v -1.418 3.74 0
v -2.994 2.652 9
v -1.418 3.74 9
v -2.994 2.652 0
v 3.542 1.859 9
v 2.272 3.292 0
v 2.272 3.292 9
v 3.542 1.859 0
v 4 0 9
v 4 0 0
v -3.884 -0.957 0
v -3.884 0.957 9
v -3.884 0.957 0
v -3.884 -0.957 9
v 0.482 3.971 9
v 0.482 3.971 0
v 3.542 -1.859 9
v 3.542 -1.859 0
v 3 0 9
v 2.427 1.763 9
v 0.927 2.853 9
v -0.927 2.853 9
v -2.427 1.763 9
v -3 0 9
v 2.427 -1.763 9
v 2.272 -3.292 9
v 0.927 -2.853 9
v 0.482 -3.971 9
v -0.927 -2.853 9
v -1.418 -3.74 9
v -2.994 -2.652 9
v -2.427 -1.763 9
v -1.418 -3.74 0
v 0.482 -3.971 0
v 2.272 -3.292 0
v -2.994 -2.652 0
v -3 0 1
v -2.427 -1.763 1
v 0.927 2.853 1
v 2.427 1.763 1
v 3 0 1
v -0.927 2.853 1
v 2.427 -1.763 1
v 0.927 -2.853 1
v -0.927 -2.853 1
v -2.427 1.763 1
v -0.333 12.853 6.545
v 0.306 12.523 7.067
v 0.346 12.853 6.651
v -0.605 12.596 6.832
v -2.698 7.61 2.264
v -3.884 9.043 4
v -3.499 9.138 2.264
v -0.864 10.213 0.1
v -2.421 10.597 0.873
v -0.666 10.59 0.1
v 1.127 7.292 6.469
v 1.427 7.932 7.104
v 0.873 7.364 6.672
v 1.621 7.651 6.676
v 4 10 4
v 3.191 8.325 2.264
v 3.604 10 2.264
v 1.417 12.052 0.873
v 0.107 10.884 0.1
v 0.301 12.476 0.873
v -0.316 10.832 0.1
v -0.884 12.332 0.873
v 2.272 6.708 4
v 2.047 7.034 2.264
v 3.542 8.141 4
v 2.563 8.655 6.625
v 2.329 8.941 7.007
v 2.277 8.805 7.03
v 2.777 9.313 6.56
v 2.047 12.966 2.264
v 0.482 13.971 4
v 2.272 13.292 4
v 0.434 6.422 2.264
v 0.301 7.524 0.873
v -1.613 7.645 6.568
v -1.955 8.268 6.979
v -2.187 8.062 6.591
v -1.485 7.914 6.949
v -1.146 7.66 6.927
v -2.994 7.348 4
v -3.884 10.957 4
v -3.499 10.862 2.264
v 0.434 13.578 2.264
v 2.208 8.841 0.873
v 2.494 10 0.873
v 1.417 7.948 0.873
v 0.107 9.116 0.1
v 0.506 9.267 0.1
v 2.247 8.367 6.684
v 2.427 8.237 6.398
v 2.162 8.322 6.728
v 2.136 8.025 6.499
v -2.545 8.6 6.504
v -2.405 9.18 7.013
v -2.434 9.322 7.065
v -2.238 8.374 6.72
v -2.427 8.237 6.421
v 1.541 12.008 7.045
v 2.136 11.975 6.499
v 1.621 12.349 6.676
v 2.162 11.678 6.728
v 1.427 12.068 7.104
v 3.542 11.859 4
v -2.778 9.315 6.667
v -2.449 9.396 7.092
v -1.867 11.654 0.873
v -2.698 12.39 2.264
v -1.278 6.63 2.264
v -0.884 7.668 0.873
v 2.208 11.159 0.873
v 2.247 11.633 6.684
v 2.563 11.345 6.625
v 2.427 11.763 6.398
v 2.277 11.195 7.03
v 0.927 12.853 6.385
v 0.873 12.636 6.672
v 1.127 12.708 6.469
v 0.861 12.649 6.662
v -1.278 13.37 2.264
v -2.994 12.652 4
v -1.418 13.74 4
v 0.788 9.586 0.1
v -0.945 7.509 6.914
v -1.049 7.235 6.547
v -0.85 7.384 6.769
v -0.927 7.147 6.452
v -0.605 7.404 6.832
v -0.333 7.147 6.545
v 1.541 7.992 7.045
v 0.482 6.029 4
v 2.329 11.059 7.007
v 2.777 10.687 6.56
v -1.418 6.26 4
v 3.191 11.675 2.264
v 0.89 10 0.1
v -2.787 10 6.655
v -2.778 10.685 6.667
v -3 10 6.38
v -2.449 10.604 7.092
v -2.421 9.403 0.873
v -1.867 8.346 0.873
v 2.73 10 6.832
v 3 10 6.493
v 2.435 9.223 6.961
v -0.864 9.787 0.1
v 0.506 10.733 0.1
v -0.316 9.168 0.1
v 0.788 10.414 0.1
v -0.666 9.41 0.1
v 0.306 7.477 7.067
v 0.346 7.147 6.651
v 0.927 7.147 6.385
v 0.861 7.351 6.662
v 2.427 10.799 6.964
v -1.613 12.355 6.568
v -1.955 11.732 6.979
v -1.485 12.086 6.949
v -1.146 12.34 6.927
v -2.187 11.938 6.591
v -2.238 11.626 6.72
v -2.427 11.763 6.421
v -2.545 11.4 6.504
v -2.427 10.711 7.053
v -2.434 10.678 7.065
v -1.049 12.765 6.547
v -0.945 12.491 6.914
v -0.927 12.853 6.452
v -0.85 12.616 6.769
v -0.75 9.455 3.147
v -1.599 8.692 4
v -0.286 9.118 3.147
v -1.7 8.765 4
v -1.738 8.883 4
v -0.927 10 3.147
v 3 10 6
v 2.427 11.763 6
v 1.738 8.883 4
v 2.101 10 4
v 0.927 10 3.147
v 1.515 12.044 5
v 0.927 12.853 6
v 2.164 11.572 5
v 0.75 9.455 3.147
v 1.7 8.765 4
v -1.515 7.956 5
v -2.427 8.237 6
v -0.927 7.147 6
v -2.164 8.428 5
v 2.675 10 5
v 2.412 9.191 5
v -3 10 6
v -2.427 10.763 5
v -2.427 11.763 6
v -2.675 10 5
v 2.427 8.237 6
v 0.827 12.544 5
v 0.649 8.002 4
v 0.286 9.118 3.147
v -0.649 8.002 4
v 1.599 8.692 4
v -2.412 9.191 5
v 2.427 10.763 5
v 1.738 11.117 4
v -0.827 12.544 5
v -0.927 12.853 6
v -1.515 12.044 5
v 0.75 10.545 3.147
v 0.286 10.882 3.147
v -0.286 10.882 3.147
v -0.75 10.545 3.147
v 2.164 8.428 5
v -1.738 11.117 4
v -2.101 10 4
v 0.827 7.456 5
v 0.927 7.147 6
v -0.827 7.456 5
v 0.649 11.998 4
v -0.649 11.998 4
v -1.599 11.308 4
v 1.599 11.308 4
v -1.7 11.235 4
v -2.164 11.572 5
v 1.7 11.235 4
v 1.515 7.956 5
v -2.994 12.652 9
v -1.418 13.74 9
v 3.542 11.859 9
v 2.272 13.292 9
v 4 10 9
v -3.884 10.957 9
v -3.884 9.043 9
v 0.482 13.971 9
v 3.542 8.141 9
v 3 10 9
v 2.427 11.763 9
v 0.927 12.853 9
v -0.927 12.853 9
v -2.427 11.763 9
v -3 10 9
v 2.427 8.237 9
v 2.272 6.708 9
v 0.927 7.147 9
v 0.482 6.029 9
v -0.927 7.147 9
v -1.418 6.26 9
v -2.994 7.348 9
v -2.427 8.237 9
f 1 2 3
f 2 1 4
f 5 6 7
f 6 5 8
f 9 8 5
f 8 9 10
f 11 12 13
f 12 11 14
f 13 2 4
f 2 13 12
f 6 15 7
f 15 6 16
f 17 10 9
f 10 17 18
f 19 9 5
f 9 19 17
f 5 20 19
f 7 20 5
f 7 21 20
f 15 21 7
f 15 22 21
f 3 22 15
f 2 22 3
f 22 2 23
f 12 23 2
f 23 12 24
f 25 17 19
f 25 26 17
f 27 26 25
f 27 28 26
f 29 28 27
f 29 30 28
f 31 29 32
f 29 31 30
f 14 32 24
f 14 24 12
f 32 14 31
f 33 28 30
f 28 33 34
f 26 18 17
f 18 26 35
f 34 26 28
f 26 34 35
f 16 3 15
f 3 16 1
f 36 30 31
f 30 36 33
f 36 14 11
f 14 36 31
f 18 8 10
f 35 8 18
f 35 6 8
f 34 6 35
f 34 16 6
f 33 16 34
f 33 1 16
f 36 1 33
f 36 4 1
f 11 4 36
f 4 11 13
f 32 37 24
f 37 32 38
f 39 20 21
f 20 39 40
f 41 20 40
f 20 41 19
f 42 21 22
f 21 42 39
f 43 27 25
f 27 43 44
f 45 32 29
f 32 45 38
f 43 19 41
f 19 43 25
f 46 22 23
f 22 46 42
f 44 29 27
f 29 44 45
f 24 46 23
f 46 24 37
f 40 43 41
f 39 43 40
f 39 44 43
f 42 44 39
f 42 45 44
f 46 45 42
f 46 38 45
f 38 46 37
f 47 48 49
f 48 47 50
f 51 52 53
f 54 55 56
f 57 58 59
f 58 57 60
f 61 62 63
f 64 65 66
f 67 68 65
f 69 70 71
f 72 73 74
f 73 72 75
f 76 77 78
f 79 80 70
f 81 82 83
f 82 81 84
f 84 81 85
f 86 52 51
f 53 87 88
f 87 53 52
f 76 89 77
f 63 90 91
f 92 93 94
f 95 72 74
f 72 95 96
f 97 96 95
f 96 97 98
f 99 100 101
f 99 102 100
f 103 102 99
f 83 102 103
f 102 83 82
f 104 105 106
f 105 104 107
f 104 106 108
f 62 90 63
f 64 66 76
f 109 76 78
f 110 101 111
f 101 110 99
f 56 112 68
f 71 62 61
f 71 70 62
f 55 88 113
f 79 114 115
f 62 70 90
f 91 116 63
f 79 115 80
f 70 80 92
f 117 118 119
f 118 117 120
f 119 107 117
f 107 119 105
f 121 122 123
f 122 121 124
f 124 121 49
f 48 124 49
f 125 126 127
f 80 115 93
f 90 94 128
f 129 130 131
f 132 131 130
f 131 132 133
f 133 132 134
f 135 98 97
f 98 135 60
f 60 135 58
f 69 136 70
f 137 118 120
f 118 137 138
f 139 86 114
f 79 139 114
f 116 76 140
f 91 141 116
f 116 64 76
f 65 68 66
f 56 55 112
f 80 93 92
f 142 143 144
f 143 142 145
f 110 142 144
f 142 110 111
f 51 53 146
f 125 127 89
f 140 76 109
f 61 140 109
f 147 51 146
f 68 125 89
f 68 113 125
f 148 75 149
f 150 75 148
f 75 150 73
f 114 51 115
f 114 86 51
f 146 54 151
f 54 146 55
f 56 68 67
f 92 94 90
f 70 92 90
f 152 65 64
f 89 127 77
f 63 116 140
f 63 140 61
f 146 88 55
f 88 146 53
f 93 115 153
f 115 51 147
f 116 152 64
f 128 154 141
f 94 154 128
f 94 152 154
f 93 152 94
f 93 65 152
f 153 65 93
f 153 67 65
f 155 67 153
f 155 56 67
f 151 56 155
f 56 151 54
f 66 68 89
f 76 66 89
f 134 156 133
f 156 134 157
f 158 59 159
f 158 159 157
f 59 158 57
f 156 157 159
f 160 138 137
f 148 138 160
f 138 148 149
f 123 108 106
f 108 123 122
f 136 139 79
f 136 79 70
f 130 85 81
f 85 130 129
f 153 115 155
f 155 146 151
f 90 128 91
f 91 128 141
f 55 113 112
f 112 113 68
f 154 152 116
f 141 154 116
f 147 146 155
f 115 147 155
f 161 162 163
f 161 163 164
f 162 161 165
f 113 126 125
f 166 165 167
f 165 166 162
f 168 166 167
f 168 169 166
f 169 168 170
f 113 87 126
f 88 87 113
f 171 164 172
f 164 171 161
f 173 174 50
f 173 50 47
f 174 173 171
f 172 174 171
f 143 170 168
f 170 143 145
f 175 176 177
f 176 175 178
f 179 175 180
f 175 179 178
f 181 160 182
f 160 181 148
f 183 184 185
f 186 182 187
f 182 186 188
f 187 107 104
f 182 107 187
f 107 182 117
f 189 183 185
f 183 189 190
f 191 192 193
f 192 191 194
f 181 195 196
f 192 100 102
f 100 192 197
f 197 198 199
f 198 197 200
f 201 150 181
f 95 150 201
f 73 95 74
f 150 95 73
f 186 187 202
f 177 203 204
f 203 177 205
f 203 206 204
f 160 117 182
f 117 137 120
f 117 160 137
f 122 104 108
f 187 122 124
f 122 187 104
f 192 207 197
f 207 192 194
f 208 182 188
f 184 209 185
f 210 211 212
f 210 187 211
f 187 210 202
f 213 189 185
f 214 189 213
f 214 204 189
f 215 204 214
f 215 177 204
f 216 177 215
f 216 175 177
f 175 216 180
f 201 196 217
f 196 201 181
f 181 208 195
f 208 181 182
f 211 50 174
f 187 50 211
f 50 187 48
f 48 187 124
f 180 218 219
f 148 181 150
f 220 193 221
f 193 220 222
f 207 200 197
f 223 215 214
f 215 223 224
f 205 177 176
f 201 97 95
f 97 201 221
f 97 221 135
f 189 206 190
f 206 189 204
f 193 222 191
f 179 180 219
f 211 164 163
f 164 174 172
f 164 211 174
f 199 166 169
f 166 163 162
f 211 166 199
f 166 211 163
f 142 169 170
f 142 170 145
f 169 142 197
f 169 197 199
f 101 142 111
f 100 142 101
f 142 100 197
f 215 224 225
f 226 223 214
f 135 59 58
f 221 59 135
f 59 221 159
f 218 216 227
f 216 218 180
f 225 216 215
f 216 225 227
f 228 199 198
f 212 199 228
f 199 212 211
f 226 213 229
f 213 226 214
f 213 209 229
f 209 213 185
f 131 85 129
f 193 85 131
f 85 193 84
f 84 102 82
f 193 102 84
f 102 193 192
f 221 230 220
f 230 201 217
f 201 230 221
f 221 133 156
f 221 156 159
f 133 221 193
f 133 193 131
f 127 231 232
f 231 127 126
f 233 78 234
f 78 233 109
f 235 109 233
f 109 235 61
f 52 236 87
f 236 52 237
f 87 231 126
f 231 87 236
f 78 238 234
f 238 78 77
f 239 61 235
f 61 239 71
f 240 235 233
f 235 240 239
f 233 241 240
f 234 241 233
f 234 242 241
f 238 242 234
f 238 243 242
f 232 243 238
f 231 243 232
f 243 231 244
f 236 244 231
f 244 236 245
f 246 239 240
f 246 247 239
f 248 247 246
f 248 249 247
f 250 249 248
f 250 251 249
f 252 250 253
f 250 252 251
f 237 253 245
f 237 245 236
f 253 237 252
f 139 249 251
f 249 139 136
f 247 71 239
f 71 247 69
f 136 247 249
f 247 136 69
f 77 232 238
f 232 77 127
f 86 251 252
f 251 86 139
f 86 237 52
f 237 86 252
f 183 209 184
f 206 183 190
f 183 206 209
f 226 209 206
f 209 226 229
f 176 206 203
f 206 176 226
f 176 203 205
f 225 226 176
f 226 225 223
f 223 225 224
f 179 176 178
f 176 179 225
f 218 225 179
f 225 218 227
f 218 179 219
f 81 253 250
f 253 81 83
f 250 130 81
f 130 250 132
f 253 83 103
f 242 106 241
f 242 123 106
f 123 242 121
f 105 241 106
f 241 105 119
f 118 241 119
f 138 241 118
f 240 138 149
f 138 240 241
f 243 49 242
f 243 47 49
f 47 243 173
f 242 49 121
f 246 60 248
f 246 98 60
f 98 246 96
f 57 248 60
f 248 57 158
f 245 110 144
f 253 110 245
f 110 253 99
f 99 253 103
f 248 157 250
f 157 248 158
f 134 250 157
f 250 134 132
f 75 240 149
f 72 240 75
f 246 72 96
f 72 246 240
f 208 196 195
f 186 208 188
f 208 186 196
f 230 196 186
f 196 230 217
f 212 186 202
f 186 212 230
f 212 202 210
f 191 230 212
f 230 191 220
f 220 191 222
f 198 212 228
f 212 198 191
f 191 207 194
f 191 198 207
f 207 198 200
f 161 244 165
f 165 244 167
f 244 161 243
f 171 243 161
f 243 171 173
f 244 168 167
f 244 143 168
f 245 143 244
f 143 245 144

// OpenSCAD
difference () {
cylinder (9,4,4);
translate([0,0,1])cylinder (10,3,3);
}
difference () {
translate ([0,10,4])
sphere(4);
translate ([0,10,6])
sphere(3);
}
difference () {
translate ([0,10,4])
cylinder (5,4,4);
translate ([0,10,5])
cylinder (5,3,3);
    
}
